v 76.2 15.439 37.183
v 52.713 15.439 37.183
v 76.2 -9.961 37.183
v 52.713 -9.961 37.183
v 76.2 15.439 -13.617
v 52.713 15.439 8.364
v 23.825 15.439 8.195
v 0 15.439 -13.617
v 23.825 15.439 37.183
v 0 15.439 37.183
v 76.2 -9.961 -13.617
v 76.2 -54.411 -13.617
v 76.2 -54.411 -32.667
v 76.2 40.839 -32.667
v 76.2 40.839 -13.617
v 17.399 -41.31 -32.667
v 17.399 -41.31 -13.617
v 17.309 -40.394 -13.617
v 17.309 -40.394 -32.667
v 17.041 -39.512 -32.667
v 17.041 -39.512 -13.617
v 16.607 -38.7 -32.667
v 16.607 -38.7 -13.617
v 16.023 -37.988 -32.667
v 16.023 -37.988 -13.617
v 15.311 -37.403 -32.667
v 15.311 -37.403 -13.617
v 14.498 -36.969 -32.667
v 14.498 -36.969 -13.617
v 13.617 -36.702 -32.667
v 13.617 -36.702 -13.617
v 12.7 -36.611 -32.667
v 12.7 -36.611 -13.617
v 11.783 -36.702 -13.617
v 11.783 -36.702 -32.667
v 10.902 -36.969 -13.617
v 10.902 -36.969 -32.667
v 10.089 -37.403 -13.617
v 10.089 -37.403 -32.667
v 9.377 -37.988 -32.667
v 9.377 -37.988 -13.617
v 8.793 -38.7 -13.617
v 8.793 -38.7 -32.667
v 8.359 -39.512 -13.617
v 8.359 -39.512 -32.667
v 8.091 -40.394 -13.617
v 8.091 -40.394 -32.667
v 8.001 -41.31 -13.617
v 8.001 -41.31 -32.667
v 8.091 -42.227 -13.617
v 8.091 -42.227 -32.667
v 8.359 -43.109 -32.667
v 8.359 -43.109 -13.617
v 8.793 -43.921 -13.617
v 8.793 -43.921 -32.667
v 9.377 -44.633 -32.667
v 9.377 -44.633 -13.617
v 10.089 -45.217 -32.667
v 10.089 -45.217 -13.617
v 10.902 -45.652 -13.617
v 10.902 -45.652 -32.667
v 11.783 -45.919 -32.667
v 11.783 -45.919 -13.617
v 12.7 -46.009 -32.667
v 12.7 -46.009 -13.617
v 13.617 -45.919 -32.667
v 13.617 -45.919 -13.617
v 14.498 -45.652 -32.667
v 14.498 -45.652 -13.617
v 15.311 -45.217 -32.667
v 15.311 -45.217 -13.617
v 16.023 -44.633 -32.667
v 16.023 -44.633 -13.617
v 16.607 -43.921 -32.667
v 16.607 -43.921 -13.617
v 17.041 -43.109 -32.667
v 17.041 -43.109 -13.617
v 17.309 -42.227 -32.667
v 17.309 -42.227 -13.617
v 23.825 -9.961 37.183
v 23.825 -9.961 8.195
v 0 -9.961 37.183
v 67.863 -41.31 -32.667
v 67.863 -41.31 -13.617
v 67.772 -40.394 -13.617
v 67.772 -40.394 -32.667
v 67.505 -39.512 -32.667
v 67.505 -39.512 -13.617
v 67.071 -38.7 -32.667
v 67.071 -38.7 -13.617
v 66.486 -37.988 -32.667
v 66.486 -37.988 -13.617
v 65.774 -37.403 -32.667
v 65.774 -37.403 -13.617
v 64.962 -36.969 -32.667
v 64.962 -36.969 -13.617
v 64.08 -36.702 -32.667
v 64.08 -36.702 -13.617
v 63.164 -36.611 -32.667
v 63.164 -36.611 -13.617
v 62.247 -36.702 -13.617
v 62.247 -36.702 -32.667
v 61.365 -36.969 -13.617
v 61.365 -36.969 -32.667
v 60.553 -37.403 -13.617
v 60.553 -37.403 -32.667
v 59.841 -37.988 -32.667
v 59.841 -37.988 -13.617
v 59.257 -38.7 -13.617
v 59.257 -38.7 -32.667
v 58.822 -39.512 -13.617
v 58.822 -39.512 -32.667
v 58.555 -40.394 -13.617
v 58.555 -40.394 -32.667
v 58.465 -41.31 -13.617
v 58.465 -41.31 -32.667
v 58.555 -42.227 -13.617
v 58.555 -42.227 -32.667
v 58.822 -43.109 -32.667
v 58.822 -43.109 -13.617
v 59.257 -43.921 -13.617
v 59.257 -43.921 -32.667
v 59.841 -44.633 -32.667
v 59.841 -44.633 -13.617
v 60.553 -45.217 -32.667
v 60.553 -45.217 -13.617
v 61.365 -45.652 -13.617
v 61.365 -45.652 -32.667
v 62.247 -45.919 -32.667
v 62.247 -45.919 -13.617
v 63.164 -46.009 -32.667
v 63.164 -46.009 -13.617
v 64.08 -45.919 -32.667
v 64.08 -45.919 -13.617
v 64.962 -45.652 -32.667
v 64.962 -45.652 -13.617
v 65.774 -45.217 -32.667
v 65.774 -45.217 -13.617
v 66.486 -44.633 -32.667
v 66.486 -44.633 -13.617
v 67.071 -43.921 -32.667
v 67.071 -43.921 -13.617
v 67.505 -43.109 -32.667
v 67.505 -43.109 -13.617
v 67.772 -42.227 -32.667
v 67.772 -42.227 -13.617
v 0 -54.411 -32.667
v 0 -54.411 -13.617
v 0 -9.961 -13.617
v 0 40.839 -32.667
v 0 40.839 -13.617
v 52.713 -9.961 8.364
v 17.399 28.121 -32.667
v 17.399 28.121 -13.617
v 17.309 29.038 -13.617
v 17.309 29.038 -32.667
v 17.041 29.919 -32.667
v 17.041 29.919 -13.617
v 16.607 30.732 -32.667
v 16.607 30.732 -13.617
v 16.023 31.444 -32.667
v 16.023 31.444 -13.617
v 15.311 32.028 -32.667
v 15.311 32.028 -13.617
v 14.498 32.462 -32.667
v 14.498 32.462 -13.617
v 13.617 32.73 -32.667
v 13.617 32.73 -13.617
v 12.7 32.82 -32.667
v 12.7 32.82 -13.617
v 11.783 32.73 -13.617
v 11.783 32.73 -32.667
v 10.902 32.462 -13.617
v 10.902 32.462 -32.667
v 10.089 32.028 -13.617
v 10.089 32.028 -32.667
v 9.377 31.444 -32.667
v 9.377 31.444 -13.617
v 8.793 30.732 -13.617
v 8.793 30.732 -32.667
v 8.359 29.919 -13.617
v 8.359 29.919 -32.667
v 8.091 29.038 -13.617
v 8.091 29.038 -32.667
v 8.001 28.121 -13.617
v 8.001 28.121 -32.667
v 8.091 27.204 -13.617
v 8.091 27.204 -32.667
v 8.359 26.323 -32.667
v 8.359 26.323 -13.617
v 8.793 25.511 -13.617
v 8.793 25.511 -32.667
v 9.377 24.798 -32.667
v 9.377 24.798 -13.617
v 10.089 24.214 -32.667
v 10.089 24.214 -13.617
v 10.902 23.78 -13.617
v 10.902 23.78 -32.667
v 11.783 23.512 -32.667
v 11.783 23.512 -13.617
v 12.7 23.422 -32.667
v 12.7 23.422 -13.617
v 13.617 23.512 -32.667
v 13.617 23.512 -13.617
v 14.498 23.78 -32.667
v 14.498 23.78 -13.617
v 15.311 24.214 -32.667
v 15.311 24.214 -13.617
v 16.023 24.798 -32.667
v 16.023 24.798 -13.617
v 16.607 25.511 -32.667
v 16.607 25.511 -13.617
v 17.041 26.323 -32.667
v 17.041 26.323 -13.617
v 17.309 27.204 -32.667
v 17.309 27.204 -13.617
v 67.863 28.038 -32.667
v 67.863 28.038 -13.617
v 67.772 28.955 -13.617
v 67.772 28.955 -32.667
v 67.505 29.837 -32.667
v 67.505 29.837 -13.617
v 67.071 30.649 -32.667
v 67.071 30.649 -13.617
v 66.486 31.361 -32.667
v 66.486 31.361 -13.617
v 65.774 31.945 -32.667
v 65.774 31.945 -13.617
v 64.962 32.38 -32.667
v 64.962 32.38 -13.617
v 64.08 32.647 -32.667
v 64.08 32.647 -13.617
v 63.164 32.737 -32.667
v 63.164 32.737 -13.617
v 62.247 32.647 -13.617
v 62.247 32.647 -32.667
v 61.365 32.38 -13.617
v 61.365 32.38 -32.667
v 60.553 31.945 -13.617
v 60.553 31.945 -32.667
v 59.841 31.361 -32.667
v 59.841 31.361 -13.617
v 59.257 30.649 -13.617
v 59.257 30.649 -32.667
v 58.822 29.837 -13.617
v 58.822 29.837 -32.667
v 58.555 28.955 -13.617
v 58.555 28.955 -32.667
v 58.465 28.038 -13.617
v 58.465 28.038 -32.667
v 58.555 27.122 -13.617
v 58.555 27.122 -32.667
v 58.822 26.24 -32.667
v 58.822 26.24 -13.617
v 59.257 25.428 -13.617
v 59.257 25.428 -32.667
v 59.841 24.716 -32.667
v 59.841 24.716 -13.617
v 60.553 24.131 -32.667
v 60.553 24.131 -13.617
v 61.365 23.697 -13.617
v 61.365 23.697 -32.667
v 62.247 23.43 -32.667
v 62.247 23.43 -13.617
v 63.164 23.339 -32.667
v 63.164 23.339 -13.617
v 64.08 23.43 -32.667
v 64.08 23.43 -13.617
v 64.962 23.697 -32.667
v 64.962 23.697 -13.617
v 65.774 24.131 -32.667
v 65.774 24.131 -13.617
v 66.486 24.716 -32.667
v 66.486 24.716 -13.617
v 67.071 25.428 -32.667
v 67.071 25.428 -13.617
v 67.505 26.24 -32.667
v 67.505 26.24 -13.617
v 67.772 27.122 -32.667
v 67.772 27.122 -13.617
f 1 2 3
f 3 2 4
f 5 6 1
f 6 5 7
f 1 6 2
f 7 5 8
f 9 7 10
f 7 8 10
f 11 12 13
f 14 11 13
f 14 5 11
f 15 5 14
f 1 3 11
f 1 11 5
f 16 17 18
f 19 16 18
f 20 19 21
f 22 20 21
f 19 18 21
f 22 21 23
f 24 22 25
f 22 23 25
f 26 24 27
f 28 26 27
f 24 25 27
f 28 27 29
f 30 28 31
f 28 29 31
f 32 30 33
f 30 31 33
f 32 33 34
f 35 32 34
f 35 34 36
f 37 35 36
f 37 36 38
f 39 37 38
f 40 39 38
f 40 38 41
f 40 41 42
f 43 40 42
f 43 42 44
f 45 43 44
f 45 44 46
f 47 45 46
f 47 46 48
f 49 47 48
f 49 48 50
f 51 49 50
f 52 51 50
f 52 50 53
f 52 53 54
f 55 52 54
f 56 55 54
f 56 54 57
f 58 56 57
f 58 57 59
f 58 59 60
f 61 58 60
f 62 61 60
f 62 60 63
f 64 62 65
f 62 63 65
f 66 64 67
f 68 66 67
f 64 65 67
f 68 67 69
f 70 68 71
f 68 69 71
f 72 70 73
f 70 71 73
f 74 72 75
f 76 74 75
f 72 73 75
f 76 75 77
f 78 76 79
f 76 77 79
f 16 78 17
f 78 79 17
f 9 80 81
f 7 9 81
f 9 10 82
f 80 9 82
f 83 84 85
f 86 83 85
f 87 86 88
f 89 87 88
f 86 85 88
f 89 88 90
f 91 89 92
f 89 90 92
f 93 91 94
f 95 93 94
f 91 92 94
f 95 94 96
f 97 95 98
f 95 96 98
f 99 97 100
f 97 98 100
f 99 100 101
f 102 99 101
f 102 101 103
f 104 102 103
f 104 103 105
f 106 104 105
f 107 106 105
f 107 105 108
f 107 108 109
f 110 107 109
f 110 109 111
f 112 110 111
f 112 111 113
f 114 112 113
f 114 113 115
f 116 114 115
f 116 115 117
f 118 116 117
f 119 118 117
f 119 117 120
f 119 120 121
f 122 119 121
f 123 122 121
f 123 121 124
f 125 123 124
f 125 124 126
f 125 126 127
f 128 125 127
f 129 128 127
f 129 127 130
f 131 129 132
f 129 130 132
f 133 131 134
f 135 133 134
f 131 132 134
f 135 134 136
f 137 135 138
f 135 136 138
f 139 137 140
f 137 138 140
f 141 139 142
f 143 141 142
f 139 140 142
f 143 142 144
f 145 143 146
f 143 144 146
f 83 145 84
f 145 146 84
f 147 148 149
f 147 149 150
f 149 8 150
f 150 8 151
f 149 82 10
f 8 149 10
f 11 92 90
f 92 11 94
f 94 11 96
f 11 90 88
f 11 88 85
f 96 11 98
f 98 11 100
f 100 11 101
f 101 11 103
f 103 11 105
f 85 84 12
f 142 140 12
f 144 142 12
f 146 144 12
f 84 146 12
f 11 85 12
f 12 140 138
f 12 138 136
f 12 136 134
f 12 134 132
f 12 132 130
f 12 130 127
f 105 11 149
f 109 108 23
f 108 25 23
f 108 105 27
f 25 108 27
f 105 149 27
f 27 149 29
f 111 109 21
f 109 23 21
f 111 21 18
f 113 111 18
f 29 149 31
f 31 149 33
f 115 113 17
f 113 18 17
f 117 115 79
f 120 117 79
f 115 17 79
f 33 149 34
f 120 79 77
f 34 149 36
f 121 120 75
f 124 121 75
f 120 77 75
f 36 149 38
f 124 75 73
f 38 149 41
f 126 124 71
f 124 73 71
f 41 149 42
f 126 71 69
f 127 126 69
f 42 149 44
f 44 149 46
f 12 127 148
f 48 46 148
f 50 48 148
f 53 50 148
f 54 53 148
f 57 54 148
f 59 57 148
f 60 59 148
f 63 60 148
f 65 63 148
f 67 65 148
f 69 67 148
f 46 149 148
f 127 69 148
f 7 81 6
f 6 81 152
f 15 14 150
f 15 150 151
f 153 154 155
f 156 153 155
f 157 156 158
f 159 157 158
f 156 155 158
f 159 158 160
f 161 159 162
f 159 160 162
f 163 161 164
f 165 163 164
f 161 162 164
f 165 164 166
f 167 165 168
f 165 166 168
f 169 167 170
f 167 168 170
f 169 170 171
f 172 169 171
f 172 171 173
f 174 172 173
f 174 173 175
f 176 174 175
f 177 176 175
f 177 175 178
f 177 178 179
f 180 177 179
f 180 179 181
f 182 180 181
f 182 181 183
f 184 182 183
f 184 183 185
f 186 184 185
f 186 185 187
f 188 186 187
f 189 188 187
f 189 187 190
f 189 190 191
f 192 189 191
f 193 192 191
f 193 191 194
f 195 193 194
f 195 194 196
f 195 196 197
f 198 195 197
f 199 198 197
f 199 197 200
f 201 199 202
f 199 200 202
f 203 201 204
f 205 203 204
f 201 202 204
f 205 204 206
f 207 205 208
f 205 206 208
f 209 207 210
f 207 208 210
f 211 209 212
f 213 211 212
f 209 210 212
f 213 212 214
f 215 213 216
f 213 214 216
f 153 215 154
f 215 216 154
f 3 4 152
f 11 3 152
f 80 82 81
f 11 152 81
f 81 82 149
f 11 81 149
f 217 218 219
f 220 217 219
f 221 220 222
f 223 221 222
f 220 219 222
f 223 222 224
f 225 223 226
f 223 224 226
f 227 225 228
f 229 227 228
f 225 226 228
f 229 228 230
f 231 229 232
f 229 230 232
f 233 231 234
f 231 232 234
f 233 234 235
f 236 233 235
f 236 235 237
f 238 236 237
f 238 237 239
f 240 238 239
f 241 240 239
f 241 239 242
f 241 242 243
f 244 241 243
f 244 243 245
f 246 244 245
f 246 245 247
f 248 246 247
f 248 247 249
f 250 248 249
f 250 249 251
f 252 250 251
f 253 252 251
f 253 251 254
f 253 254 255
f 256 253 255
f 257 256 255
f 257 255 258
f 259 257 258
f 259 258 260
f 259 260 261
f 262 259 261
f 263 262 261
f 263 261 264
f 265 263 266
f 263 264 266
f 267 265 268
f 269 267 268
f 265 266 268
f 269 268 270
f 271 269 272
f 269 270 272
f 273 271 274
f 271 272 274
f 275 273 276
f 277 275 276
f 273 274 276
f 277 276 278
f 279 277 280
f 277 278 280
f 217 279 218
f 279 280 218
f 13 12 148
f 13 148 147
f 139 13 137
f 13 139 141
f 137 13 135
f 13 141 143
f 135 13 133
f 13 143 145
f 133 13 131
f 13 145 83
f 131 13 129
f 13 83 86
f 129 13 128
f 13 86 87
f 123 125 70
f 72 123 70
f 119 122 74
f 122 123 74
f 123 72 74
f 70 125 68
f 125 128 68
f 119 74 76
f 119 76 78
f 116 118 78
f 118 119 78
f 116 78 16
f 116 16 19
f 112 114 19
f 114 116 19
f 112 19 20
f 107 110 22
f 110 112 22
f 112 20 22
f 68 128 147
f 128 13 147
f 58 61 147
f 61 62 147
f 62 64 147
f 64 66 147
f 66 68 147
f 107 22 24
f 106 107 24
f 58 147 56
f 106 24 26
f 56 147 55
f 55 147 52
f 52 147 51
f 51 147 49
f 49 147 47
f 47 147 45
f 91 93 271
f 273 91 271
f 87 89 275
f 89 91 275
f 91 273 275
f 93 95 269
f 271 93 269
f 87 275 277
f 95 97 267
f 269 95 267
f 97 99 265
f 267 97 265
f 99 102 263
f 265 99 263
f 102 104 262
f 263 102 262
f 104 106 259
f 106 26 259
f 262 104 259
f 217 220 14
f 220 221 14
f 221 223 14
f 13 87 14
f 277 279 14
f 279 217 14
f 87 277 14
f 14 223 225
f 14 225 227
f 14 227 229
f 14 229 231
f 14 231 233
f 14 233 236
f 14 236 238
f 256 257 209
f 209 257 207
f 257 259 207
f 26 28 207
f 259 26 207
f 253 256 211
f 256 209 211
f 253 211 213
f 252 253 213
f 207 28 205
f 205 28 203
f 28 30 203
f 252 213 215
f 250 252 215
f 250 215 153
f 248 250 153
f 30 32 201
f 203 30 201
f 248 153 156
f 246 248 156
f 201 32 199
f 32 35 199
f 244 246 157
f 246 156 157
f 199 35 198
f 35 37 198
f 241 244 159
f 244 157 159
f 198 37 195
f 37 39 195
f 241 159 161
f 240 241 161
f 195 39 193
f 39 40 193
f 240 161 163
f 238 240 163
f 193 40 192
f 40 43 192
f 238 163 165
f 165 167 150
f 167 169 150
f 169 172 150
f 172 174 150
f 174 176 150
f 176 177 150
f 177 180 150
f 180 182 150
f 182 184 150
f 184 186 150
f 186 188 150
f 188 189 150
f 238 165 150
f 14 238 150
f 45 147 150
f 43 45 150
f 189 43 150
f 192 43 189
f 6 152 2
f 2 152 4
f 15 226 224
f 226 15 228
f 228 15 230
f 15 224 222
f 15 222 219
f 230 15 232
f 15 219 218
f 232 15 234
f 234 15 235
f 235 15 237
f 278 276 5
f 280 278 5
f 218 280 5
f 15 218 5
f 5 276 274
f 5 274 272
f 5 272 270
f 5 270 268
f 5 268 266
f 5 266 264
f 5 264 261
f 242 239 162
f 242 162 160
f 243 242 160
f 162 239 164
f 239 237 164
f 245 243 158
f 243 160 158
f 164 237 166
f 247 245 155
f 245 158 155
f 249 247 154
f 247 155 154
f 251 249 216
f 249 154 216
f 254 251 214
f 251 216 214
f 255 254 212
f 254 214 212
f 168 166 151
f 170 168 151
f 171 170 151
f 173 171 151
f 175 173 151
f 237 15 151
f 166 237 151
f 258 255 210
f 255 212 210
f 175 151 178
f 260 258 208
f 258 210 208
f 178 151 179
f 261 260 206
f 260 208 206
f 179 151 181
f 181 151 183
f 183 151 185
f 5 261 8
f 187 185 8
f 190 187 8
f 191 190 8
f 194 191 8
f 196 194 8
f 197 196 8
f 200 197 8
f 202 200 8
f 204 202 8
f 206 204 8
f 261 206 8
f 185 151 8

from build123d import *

# Parameters (mm, degrees)
F1_DEPTH      = 76.2
F3_DEPTH      = 54.411857
F3_DEPTH_BACK = 50.8
F4_R          = 4.699
F5_DEPTH      = 32.667806


with BuildPart() as f1:
    # F0 (on Right) → F1 (new body)
    with BuildSketch(Plane.YZ):
        Polygon((-54.410857, -32.666806), (40.839143, -32.666806), (40.839143, -13.616806), (15.439143, -13.616806), (15.439143, 37.183194), (-9.960857, 37.183194), (-9.960857, -13.616806), (-54.410857, -13.616806), align=None)
    extrude(amount=F1_DEPTH)

    # F2 (on Front) → F3 (cut, two sides)
    with BuildSketch(Plane.XZ) as f3_sk:
        Polygon((52.712968, 8.363965), (52.712968, 36.938965), (52.712968, 49.710356), (23.8252, 49.710356), (23.8252, 36.769882), (23.8252, 8.194882), align=None)
    extrude(amount=F3_DEPTH, mode=Mode.SUBTRACT)
    extrude(f3_sk.sketch, amount=-F3_DEPTH_BACK, mode=Mode.SUBTRACT)

    # F4 (on Top) → F5 (cut, through all)
    with BuildSketch(Plane.XY):
        with Locations((12.7, 28.12115)):
            Circle(F4_R)
        with Locations((63.163701, 28.038393)):
            Circle(F4_R)
        with Locations((63.163701, -41.310414)):
            Circle(F4_R)
        with Locations((12.7, -41.310414)):
            Circle(F4_R)
    extrude(amount=-F5_DEPTH, mode=Mode.SUBTRACT)


solid = f1.part
